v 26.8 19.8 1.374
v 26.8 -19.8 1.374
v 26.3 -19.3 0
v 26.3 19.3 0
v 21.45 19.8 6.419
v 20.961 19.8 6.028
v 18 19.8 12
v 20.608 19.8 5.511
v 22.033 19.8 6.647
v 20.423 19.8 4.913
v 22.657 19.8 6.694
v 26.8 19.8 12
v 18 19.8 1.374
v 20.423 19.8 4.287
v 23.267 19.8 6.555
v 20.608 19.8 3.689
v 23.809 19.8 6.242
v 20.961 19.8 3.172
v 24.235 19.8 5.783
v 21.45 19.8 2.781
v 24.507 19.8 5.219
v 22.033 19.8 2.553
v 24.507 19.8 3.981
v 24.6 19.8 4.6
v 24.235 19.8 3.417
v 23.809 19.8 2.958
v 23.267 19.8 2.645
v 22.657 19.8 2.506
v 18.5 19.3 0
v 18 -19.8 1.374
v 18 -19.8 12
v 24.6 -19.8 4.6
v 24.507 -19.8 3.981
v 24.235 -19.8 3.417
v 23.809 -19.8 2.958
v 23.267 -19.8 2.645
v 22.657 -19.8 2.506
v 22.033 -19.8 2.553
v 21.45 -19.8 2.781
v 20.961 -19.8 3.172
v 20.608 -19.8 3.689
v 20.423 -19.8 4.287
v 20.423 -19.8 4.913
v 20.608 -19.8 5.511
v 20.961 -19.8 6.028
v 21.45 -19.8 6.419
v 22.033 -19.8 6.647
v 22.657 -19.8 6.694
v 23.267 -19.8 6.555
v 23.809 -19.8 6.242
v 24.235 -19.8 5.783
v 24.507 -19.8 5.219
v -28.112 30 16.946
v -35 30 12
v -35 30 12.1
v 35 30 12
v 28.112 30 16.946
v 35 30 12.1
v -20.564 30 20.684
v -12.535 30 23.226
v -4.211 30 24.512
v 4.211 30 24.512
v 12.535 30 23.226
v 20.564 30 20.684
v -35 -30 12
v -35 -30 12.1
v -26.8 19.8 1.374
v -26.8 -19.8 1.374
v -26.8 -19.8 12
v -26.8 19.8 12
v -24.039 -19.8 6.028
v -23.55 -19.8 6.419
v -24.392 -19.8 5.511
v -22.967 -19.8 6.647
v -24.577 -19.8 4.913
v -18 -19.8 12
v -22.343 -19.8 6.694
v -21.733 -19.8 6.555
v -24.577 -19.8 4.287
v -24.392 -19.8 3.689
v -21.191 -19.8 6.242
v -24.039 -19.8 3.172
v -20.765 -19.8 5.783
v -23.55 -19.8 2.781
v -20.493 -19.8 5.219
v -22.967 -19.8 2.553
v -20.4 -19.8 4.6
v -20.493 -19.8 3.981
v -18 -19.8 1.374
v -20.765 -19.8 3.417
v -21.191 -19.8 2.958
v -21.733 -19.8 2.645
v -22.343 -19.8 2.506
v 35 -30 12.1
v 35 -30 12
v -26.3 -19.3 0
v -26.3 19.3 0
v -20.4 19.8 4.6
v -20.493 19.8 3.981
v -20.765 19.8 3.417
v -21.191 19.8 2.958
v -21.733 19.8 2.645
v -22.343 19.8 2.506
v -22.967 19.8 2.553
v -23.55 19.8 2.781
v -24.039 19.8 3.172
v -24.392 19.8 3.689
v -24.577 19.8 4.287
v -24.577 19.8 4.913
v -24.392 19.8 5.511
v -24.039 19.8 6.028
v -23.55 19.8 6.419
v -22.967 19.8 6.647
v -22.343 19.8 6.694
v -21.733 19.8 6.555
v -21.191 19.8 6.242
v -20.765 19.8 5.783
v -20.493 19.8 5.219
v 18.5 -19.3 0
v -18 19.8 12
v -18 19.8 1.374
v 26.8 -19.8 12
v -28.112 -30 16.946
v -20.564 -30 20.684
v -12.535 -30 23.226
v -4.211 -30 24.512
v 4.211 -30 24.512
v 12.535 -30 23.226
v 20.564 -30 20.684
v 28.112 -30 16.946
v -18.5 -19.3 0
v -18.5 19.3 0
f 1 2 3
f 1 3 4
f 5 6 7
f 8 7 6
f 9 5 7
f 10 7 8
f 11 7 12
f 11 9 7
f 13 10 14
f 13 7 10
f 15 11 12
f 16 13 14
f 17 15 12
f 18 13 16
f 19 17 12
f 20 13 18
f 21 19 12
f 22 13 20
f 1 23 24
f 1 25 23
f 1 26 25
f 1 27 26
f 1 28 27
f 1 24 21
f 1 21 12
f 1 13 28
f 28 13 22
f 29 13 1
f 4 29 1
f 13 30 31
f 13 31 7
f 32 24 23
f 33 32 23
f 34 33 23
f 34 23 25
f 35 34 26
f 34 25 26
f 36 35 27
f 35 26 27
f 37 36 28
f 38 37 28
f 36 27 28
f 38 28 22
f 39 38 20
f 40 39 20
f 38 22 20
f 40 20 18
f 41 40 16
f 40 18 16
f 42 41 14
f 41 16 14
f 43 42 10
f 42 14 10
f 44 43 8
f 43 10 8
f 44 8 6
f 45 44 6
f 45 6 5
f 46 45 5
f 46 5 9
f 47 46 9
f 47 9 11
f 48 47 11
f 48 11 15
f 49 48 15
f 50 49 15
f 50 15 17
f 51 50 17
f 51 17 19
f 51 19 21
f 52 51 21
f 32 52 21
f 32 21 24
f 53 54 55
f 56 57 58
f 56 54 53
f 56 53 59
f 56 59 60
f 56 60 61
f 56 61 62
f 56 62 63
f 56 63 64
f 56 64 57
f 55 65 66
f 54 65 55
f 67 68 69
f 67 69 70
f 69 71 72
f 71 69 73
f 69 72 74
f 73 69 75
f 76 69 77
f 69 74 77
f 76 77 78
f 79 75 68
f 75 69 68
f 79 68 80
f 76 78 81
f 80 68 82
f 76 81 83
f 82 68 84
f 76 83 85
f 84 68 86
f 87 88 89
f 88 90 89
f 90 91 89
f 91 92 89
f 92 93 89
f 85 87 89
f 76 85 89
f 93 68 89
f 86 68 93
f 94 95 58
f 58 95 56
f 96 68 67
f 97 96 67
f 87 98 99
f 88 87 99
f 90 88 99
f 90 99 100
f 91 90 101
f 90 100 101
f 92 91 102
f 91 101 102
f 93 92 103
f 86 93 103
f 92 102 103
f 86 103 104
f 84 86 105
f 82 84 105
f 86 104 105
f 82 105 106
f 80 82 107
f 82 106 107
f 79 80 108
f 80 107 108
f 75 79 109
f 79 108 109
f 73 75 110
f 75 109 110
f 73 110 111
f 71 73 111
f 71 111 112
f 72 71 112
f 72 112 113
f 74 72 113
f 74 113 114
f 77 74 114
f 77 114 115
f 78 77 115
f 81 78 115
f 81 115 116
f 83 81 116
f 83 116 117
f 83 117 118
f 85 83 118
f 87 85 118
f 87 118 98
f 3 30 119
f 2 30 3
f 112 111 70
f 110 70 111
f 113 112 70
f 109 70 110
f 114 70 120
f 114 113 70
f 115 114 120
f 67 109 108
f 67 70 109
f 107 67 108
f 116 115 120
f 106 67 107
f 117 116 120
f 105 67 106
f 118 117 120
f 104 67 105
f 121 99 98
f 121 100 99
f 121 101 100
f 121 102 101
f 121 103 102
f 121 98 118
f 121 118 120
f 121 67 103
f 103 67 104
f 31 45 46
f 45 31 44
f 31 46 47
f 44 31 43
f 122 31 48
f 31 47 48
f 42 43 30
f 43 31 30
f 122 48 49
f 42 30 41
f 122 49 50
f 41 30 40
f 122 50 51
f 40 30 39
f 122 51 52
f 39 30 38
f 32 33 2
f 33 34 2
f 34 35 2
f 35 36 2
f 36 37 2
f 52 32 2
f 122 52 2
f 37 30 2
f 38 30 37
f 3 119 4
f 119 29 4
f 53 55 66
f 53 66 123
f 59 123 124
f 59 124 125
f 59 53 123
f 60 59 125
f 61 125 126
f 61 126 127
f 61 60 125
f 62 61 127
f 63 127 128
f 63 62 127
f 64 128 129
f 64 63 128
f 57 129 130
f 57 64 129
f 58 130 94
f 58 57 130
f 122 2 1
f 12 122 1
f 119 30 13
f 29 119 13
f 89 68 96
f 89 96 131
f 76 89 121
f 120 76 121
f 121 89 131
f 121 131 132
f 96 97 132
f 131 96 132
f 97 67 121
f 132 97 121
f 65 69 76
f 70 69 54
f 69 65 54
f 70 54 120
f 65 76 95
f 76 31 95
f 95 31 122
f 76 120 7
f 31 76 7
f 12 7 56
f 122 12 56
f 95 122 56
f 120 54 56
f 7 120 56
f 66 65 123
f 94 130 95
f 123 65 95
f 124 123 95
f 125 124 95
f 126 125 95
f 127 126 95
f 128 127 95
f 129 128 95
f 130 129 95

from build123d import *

# Parameters (mm, degrees)
SKETCH2_W             = 53.6
SKETCH2_H             = 39.6
BOSS_EXTRUDE1_DEPTH   = 12
SKETCH3_W             = 70
SKETCH3_H             = 60
BOSS_EXTRUDE2_DEPTH   = 0.1
SKETCH4_R             = 2.1
CUT_EXTRUDE1_DEPTH    = 50.8
SKETCH5_W             = 36
SKETCH5_H             = 39.6
CUT_EXTRUDE2_DEPTH    = 12
CHAMFER1_SIZE         = 0.5
CHAMFER1_SIZE2        = 1.37373871
CHAMFER1_PART_2_SIZE  = 0.5
CHAMFER1_PART_2_SIZE2 = 1.37373871
BOSS_EXTRUDE3_DEPTH   = 60


with BuildPart() as part:
    # Sketch2 → Boss-Extrude1 (new body)
    with BuildSketch(Plane.XY):
        Rectangle(SKETCH2_W, SKETCH2_H)
    extrude(amount=BOSS_EXTRUDE1_DEPTH)

    # Sketch3 → Boss-Extrude2 (add)
    with BuildSketch(Plane.XY.offset(12)):
        Rectangle(SKETCH3_W, SKETCH3_H)
    extrude(amount=BOSS_EXTRUDE2_DEPTH)

    # Sketch4 → Cut-Extrude1 (cut, through all)
    with BuildSketch(Plane(origin=(0, 19.8, 0), x_dir=(1, 0, 0), z_dir=(0, 1, 0))):
        with Locations((22.5, -4.6)):
            Circle(SKETCH4_R)
        with Locations((-22.5, -4.6)):
            Circle(SKETCH4_R)
    extrude(amount=-CUT_EXTRUDE1_DEPTH, mode=Mode.SUBTRACT)

    # Sketch5 → Cut-Extrude2 (cut)
    with BuildSketch(Plane(origin=(0, 0, 0), x_dir=(-1, 0, 0), z_dir=(0, 0, -1))):
        Rectangle(SKETCH5_W, SKETCH5_H)
    extrude(amount=-CUT_EXTRUDE2_DEPTH, mode=Mode.SUBTRACT)

    # Chamfer1
    chamfer1_edges = [part.edges().sort_by_distance(p)[0] for p in [
        (-22.4, 19.8, 0),
        (-18, 0, 0),
        (-22.4, -19.8, 0),
        (-26.8, 0, 0),
    ]]
    chamfer1_side = [part.faces().sort_by_distance(p)[0] for p in [
        (-22.4, 0, 0),
    ]]
    chamfer(chamfer1_edges, length=CHAMFER1_SIZE, length2=CHAMFER1_SIZE2, reference=chamfer1_side[0])

    # Chamfer1 part 2
    chamfer1_part_2_edges = [part.edges().sort_by_distance(p)[0] for p in [
        (22.4, -19.8, 0),
        (18, 0, 0),
        (22.4, 19.8, 0),
        (26.8, 0, 0),
    ]]
    chamfer1_part_2_side = [part.faces().sort_by_distance(p)[0] for p in [
        (22.4, 0, 0),
    ]]
    chamfer(chamfer1_part_2_edges, length=CHAMFER1_PART_2_SIZE, length2=CHAMFER1_PART_2_SIZE2, reference=chamfer1_part_2_side[0])

    # Sketch6 → Boss-Extrude3 (add)
    with BuildSketch(Plane(origin=(0, 30, 0), x_dir=(1, 0, 0), z_dir=(0, 1, 0))):
        with BuildLine():
            Line((35, -12.1), (-35, -12.1))
            ThreePointArc((-35, -12.1), (0, -24.673593129), (35, -12.1))
        make_face()
    extrude(amount=-BOSS_EXTRUDE3_DEPTH)


solid = part.part
